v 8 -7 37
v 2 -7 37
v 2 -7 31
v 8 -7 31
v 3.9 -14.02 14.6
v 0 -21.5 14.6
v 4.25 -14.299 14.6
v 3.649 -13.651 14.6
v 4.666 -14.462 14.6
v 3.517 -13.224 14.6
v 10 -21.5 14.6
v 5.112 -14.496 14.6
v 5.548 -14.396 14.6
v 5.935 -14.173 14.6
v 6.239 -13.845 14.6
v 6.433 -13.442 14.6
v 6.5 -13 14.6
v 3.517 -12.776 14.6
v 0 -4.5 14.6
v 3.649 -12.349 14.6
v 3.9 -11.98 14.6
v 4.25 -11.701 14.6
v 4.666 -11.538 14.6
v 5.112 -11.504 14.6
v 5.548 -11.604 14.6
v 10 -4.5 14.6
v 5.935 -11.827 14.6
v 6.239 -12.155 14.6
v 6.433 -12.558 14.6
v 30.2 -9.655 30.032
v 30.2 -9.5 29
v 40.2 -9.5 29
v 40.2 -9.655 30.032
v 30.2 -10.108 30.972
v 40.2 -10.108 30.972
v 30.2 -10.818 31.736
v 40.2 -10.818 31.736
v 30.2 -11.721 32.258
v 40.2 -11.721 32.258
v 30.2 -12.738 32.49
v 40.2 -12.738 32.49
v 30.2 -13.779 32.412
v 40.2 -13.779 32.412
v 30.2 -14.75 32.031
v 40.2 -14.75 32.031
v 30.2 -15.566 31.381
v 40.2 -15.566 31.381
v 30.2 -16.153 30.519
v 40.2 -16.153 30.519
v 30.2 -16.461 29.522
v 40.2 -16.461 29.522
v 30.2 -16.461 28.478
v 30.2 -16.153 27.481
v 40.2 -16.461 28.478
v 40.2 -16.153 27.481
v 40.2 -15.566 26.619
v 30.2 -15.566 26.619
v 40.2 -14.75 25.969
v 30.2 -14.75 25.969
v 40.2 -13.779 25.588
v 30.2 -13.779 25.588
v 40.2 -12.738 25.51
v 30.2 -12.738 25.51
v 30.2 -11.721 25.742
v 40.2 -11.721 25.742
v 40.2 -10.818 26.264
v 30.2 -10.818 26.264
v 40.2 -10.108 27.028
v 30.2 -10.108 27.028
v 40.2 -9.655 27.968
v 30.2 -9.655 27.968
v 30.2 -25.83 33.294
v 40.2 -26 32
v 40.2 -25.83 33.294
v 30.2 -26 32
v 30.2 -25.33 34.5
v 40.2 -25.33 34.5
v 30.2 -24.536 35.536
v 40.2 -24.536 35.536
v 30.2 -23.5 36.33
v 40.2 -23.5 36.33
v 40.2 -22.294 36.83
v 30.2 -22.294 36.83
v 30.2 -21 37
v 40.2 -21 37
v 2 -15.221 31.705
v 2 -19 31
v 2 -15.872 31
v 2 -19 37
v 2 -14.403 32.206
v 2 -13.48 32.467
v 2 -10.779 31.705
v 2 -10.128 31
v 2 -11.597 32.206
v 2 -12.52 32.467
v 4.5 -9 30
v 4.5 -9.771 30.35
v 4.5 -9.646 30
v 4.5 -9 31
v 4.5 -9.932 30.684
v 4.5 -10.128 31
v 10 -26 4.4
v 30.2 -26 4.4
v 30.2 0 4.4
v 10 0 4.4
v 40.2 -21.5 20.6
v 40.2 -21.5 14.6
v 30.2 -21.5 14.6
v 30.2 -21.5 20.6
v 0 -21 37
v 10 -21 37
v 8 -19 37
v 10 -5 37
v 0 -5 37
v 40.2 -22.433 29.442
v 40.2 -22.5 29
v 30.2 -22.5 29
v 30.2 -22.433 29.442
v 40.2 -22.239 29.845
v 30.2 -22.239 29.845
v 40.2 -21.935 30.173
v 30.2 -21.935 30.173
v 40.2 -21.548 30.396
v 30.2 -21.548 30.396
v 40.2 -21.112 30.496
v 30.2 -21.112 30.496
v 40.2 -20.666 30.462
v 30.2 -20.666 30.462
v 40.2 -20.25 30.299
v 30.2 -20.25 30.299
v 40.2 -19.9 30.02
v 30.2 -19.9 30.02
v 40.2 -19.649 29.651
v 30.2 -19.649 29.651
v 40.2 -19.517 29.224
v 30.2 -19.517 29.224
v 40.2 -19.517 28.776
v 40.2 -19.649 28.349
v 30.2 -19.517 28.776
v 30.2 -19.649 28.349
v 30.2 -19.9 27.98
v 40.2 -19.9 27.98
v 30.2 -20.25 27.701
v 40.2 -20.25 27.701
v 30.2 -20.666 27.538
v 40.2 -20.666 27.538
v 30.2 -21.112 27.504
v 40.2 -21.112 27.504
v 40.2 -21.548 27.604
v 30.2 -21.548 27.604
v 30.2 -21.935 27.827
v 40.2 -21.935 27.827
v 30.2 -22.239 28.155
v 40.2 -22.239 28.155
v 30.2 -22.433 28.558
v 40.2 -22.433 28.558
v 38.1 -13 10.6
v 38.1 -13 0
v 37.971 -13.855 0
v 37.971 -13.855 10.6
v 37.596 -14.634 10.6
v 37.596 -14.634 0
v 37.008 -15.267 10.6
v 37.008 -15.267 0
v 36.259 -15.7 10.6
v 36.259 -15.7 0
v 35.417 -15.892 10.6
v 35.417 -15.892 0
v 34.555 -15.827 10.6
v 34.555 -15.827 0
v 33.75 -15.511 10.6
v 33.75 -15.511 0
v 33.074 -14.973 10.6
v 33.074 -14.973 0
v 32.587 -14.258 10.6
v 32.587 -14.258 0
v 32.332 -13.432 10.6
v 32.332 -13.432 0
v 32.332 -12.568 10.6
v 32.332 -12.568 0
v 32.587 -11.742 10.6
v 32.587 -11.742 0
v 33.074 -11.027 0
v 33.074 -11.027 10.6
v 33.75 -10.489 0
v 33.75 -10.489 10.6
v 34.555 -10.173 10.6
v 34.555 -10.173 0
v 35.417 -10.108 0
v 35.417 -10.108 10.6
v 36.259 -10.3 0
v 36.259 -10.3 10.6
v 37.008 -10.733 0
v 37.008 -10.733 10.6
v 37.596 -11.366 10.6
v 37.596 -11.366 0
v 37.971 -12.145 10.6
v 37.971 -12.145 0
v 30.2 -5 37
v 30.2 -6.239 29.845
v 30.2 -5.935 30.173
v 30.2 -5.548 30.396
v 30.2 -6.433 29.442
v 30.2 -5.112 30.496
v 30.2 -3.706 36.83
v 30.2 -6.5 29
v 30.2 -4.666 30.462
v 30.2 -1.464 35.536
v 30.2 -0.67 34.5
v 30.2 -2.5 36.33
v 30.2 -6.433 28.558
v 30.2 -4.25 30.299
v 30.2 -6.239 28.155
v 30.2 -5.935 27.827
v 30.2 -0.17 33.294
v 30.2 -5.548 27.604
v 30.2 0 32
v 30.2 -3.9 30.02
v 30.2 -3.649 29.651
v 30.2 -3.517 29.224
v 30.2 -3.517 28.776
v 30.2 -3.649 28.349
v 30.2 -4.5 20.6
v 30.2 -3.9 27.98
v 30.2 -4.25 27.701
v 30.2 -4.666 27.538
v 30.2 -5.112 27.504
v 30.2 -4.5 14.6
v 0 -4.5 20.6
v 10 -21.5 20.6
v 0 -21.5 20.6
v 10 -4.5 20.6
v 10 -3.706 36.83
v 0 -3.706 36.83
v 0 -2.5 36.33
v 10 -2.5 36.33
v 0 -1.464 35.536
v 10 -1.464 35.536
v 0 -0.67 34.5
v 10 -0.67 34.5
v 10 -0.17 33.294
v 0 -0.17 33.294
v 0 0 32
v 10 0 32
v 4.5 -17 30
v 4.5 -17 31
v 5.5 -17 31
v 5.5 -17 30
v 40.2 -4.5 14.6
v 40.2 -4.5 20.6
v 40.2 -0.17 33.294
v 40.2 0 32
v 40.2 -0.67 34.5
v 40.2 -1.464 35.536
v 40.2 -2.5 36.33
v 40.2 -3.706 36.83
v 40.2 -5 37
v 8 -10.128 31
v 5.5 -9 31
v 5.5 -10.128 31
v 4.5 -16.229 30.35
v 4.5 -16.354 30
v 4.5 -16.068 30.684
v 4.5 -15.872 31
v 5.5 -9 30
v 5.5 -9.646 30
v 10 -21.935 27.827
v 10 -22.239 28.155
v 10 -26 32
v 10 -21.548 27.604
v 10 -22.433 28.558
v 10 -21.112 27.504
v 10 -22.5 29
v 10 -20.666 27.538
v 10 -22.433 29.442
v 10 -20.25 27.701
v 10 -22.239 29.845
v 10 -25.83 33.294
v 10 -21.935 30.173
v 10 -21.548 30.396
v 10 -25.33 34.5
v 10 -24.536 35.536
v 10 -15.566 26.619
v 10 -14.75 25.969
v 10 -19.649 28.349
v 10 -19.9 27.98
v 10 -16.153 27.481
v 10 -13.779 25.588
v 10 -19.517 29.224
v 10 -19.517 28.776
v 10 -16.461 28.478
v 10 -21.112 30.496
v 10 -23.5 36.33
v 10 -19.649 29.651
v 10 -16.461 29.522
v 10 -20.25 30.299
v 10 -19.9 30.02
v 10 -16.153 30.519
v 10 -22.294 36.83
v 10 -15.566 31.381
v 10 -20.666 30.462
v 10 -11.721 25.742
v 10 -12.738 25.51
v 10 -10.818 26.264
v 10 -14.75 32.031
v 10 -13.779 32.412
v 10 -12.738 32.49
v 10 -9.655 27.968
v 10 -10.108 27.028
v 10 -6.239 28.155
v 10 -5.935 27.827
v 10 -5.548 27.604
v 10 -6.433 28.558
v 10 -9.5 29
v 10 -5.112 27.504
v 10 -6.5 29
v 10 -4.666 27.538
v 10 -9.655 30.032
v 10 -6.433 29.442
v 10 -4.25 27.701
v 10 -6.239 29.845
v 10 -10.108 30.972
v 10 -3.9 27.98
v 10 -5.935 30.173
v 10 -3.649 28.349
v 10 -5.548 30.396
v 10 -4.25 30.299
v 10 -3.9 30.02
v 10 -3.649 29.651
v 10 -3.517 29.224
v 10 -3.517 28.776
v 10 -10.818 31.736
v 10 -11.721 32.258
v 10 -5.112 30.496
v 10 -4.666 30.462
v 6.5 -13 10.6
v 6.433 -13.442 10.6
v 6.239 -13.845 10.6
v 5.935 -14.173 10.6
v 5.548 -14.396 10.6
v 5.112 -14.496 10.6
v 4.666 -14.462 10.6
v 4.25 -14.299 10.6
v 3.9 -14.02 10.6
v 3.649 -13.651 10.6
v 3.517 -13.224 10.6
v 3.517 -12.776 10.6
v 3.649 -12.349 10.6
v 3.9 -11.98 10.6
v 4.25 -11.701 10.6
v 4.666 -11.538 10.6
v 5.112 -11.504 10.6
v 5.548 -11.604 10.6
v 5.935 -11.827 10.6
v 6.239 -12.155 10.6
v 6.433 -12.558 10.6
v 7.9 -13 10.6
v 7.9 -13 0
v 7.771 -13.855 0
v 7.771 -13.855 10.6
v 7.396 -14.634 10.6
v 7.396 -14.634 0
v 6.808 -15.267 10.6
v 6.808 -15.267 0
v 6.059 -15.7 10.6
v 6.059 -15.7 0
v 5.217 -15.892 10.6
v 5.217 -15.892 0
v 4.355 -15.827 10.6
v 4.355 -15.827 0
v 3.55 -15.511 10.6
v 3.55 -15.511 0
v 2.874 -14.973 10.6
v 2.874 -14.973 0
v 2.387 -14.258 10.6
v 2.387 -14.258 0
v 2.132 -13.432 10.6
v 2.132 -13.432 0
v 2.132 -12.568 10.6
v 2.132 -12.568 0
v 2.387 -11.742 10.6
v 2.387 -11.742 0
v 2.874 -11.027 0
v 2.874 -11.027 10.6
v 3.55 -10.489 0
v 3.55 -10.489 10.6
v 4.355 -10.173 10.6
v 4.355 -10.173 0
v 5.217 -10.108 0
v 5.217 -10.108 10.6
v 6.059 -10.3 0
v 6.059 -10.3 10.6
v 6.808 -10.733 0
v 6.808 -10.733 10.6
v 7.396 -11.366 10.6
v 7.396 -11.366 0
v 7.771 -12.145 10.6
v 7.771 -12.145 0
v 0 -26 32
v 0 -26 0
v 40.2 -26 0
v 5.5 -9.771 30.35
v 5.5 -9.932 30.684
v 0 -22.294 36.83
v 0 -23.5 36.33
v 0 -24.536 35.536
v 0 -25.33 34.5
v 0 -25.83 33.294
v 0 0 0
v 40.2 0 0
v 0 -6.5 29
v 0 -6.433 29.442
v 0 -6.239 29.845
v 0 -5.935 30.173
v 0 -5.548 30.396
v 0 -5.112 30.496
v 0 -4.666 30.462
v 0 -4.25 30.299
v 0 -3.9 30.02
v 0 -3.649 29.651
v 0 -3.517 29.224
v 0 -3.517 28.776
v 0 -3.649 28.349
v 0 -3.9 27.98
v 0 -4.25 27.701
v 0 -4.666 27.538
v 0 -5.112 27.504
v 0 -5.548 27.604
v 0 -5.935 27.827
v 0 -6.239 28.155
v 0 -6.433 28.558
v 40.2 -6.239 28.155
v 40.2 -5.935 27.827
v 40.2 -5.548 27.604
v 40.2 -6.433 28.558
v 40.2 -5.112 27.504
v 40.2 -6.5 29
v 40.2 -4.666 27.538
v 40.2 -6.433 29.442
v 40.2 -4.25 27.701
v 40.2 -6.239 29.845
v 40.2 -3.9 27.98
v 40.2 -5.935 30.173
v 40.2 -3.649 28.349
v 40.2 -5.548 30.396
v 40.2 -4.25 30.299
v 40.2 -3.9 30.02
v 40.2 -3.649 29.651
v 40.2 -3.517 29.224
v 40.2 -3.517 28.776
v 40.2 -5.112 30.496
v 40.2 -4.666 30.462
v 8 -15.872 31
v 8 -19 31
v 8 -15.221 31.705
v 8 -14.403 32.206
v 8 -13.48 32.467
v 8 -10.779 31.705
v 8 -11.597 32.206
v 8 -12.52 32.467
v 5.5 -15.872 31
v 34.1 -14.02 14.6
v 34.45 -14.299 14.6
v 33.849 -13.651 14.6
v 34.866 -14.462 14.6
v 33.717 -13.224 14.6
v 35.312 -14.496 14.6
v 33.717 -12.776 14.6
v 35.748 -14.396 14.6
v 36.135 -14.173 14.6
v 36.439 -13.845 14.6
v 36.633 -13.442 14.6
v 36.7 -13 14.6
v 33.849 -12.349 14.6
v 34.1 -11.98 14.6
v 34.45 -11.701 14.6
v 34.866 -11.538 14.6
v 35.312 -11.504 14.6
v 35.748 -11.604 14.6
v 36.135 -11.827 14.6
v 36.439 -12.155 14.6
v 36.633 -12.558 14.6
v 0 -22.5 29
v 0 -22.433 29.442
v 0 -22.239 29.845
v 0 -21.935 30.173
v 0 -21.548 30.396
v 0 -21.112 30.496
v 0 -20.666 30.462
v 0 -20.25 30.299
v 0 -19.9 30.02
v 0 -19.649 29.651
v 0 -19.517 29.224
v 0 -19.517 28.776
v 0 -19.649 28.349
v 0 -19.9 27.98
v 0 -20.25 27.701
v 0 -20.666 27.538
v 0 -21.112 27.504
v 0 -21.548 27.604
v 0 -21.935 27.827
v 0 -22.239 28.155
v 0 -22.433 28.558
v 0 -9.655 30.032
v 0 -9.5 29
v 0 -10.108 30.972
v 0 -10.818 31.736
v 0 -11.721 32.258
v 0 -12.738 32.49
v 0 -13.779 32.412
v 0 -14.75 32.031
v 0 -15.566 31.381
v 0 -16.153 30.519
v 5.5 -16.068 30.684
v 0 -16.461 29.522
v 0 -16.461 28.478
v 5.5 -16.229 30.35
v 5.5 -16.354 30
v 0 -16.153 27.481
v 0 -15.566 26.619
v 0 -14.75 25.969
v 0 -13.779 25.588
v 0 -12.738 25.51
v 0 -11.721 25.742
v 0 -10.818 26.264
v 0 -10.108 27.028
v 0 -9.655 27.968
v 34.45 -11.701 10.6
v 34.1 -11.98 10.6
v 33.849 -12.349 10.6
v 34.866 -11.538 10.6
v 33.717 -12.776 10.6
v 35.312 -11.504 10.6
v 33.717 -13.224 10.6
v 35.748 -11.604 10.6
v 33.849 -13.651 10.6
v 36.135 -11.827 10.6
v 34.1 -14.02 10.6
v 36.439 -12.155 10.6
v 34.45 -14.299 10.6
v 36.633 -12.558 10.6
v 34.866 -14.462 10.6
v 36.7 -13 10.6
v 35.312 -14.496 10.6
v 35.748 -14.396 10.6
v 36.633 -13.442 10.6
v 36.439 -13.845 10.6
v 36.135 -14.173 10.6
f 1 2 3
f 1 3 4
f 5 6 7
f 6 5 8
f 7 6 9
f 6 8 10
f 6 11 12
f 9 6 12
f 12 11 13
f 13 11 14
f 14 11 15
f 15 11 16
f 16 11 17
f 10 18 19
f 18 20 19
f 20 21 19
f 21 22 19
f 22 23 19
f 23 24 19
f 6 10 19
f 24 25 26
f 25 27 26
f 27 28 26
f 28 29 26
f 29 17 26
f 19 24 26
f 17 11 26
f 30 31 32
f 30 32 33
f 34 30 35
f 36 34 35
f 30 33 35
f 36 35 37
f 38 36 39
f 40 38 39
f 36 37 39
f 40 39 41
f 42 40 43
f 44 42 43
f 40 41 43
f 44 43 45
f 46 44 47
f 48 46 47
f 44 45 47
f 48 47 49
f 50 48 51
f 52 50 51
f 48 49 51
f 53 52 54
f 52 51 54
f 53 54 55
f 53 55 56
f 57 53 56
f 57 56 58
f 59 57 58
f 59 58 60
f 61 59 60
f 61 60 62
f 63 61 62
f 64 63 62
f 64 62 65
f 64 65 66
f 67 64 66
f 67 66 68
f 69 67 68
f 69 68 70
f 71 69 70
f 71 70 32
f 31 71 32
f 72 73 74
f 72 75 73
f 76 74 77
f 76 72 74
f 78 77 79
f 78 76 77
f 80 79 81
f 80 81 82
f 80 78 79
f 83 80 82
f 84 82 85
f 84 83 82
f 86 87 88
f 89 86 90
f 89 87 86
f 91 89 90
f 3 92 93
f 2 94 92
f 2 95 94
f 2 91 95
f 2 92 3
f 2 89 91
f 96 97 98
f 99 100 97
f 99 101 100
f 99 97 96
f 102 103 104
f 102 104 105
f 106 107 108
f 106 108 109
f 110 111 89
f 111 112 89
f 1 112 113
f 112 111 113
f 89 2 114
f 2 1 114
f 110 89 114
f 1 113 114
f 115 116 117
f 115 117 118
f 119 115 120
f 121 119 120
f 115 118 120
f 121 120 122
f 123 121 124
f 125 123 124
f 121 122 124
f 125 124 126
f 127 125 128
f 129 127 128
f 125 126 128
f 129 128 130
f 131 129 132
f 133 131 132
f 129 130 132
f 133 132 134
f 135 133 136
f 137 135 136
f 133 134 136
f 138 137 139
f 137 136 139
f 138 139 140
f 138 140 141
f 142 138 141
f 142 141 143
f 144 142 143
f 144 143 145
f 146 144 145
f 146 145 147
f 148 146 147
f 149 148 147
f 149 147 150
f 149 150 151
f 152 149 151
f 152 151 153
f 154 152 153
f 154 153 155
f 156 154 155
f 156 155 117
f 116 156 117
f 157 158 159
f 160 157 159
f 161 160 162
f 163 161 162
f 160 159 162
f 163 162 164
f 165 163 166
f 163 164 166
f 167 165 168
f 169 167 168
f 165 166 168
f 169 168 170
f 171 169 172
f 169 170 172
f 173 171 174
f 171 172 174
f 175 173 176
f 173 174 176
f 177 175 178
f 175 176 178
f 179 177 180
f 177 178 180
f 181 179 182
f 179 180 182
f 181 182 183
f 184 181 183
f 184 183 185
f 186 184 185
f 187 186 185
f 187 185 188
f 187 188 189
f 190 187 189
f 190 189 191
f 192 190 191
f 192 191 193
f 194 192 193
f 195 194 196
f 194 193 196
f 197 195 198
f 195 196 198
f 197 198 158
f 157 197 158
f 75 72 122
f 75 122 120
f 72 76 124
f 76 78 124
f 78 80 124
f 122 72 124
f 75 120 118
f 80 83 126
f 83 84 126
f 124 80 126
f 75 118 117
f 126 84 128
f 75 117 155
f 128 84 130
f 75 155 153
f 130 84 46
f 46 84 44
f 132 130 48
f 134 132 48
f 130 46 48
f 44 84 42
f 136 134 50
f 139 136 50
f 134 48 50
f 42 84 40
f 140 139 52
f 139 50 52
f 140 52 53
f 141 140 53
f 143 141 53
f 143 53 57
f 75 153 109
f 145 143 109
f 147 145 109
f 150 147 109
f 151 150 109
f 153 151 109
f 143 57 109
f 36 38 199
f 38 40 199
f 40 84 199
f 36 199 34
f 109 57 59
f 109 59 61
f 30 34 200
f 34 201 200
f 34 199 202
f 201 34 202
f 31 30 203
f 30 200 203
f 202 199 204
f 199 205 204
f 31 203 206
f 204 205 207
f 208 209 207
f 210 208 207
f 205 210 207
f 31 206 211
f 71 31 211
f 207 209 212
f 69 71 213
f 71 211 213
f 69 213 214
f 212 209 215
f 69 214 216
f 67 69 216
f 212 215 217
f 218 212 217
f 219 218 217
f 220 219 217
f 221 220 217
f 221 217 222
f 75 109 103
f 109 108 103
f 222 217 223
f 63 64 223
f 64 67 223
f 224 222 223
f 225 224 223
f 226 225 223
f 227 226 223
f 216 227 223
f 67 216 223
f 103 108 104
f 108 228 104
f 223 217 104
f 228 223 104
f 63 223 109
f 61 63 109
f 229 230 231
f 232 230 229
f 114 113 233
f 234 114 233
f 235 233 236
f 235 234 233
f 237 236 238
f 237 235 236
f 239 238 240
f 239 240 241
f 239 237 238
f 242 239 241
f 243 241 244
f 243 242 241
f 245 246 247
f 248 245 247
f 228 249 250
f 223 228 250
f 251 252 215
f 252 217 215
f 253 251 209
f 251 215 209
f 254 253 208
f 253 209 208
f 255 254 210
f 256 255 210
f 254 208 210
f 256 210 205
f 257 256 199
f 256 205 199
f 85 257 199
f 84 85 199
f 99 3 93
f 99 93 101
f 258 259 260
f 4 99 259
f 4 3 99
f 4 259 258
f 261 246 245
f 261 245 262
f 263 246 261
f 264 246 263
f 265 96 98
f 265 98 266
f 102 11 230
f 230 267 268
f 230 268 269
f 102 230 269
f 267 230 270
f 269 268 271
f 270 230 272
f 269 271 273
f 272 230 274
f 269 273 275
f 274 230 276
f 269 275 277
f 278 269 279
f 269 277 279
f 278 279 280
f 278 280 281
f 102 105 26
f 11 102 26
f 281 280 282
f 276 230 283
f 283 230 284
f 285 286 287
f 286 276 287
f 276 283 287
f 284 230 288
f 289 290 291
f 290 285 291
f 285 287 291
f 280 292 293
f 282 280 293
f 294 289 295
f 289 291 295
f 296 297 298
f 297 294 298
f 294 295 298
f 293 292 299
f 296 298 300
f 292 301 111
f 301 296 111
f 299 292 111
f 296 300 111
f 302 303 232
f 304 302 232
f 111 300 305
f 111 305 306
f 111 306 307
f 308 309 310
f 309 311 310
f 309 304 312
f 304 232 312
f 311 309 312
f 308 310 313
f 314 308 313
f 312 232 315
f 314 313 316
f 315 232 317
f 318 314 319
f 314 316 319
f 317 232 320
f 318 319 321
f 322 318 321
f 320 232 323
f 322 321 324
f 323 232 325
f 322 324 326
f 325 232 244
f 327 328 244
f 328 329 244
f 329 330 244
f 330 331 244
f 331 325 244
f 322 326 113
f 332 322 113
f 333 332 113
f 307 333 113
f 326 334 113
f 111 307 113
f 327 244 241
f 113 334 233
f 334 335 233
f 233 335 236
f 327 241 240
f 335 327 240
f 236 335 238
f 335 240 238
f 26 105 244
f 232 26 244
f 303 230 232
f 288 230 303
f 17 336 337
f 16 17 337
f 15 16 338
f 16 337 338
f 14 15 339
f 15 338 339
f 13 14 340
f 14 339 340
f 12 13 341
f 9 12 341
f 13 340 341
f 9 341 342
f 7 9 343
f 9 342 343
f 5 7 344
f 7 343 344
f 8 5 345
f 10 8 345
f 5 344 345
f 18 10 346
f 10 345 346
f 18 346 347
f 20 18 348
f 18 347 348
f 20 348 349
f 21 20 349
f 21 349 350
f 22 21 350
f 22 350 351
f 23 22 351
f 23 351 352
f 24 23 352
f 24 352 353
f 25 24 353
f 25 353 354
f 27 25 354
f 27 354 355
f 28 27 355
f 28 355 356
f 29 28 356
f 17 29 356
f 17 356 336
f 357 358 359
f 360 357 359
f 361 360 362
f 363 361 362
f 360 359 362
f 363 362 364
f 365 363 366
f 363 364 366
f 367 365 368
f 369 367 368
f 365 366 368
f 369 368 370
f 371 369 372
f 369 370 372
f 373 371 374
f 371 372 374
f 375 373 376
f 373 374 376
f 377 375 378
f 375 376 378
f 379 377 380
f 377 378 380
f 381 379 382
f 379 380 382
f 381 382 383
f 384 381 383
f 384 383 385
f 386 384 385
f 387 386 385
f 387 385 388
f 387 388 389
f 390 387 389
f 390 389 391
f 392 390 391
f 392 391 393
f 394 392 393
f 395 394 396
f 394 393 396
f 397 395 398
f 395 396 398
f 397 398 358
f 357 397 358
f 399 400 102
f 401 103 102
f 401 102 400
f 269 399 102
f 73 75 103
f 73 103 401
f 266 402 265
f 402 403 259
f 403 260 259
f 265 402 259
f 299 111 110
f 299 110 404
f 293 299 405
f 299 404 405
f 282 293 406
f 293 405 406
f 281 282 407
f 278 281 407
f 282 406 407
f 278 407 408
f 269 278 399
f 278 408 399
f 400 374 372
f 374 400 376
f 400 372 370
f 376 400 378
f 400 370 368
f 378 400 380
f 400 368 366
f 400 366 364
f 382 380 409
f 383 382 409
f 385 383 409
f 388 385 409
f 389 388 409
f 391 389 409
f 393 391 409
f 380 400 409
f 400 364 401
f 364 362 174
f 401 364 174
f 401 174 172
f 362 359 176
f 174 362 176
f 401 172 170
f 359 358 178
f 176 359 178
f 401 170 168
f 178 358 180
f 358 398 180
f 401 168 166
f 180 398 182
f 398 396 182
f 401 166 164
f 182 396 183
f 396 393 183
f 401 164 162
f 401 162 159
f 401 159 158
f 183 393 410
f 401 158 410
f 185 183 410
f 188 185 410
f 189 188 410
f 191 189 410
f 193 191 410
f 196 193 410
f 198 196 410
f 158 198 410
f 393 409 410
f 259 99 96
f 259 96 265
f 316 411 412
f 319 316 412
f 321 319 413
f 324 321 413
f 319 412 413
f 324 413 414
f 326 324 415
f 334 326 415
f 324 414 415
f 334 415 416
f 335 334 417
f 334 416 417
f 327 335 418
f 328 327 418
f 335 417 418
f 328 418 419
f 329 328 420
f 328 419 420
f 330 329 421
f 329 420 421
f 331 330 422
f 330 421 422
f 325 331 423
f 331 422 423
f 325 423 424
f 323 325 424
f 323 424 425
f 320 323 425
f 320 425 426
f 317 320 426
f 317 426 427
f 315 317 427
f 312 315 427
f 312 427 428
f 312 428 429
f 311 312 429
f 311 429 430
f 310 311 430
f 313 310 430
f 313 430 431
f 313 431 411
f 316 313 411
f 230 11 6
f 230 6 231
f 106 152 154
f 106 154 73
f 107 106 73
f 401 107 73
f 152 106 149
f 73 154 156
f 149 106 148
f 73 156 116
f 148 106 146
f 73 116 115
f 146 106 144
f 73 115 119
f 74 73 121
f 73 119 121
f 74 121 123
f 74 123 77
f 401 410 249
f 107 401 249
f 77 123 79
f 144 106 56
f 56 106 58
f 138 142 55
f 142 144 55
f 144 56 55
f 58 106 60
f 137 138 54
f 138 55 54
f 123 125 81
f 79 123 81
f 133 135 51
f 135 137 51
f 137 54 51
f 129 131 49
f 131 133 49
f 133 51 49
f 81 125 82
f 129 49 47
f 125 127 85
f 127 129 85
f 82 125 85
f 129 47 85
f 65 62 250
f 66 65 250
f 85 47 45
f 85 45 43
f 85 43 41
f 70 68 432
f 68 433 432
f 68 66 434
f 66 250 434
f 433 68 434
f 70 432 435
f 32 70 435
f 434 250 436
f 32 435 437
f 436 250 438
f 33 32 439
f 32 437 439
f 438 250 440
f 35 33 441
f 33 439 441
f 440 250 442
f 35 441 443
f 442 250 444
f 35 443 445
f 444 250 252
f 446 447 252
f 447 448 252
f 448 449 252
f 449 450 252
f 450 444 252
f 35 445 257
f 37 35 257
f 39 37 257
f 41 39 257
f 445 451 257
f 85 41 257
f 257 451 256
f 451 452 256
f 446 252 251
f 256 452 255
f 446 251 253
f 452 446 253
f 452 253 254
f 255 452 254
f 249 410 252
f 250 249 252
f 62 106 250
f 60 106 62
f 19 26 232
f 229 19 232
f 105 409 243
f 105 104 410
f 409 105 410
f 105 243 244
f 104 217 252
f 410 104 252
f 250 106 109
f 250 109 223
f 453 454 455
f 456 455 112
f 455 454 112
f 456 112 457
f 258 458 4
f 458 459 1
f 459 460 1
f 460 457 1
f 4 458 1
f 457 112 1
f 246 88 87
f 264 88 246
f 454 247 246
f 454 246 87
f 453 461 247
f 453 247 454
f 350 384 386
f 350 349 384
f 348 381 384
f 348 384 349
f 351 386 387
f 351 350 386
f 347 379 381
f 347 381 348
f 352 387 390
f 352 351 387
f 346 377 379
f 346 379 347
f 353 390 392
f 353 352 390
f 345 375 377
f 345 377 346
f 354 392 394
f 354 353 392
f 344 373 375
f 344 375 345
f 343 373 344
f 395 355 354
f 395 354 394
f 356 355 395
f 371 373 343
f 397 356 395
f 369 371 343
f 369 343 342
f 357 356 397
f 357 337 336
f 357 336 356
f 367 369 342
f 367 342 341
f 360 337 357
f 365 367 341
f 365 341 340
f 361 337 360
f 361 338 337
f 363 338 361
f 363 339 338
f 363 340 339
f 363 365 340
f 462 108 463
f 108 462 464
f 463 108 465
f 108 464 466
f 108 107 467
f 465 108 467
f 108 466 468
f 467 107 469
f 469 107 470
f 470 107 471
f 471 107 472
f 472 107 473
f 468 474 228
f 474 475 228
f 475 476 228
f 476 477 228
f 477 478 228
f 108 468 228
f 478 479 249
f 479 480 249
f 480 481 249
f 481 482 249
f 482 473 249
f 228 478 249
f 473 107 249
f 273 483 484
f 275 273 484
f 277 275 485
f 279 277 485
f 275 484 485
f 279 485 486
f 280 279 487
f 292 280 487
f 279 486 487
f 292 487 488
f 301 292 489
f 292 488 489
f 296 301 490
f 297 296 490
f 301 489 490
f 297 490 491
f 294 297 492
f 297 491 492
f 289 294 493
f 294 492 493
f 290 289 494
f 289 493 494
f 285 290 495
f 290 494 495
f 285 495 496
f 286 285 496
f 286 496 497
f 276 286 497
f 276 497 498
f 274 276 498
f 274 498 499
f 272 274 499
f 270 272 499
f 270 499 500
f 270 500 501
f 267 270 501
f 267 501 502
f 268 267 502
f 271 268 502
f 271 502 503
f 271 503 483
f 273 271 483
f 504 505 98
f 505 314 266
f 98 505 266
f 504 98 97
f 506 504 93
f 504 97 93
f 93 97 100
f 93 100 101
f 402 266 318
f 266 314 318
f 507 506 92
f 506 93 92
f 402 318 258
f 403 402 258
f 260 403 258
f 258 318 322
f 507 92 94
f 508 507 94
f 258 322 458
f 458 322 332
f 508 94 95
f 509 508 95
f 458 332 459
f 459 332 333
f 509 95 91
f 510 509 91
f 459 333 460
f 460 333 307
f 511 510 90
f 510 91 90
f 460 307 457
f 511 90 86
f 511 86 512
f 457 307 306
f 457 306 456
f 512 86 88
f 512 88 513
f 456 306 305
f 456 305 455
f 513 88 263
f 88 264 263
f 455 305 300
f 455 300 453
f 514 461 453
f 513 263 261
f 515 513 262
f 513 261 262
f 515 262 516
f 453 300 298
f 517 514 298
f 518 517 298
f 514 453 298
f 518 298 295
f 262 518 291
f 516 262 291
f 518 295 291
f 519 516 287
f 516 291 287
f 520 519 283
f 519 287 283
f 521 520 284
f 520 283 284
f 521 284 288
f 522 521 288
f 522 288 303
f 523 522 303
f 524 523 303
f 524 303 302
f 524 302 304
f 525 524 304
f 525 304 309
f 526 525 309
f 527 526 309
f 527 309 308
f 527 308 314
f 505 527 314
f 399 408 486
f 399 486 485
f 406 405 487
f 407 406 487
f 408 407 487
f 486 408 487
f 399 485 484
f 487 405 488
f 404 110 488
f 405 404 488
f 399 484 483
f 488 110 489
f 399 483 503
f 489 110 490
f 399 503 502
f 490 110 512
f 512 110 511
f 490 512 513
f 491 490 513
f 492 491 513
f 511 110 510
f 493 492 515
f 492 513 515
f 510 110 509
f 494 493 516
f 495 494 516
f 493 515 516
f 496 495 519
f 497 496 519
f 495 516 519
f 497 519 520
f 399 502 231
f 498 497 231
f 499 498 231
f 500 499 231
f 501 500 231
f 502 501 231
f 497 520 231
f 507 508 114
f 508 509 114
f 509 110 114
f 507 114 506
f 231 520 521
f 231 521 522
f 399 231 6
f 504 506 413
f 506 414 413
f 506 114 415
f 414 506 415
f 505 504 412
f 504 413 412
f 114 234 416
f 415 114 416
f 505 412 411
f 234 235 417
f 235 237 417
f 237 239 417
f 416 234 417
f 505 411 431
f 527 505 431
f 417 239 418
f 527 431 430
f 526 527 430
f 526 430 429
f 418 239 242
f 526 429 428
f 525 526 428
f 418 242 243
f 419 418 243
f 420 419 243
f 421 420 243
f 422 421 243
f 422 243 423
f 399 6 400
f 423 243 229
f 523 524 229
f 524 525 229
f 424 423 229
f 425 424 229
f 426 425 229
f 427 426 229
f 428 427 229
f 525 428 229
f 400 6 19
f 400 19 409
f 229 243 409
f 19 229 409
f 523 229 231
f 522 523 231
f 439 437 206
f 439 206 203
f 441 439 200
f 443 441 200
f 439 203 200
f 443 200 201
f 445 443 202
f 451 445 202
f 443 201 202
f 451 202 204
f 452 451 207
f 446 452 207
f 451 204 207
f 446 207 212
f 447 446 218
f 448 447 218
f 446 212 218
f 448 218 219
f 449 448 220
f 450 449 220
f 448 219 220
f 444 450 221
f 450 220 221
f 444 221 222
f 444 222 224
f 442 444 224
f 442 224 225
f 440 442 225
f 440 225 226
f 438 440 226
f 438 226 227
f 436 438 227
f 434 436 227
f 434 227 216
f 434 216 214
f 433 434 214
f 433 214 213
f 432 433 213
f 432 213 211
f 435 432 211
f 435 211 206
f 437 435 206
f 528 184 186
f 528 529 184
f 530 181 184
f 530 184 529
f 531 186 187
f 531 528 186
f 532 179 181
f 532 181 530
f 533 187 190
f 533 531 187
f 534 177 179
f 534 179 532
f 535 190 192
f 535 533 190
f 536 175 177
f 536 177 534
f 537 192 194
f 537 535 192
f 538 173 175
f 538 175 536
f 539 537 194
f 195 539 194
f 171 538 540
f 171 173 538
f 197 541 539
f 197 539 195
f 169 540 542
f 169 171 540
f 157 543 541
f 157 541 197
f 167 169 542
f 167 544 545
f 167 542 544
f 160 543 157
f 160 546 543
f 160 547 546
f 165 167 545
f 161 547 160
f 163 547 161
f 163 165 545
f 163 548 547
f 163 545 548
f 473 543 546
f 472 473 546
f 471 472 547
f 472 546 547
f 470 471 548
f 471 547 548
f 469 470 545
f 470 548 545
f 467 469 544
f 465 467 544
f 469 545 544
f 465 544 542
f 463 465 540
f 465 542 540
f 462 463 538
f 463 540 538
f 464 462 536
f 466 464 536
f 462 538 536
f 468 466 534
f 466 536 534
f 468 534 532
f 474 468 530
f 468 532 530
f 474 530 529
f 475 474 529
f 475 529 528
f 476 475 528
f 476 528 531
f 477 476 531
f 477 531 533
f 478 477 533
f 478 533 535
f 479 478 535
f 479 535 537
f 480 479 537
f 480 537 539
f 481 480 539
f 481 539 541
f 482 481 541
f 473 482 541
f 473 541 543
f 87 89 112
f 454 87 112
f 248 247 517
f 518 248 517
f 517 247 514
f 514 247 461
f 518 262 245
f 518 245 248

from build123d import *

# Parameters (mm, degrees)
F1_DEPTH  = 26
F2_W      = 17
F2_H      = 6
F3_DEPTH  = 40.2
F4_R      = 3.5
F5_DEPTH  = 40.2
F6_R      = 1.5
F7_DEPTH  = 20.6
F8_R      = 2.9
F9_DEPTH  = 10.6
F10_R     = 1.5
F11_DEPTH = 40.2
F12_W     = 6
F12_H     = 12
F13_DEPTH = 6
F14_W     = 1
F14_H     = 8
F15_DEPTH = 1
F16_R     = 5


with BuildPart() as f1:
    # F0 (on Front) → F1 (new body)
    with BuildSketch(Plane.XZ):
        Polygon((0, 37), (0, 0), (40.2, 0), (40.2, 37), (30.2, 37), (30.2, 4.4), (10, 4.4), (10, 37), align=None)
    extrude(amount=F1_DEPTH)

    # F2 (on face) → F3 (cut, through all)
    with BuildSketch(Plane.YZ.offset(40.2)):
        with Locations((-13, 17.6)):
            Rectangle(F2_W, F2_H)
    extrude(amount=-F3_DEPTH, mode=Mode.SUBTRACT)

    # F4 (on face) → F5 (cut, through all)
    with BuildSketch(Plane.YZ.offset(40.2)):
        with Locations((-13, 29)):
            Circle(F4_R)
    extrude(amount=-F5_DEPTH, mode=Mode.SUBTRACT)

    # F6 (on face) → F7 (cut, through all)
    with BuildSketch(Plane(origin=(0, 0, 0), x_dir=(1, 0, 0), z_dir=(0, 0, -1))):
        with Locations((5, 13)):
            Circle(F6_R)
        with Locations((35.2, 13)):
            Circle(F6_R)
    extrude(amount=-F7_DEPTH, mode=Mode.SUBTRACT)

    # F8 (on face) → F9 (cut)
    with BuildSketch(Plane(origin=(0, 0, 0), x_dir=(1, 0, 0), z_dir=(0, 0, -1))):
        with Locations((5, 13)):
            Circle(F8_R)
        with Locations((35.2, 13)):
            Circle(F8_R)
    extrude(amount=-F9_DEPTH, mode=Mode.SUBTRACT)

    # F10 (on face) → F11 (cut, through all)
    with BuildSketch(Plane(origin=(0, 0, 0), x_dir=(0, -1, 0), z_dir=(-1, 0, 0))):
        with Locations((5, 29)):
            Circle(F10_R)
        with Locations((21, 29)):
            Circle(F10_R)
    extrude(amount=-F11_DEPTH, mode=Mode.SUBTRACT)

    # F12 (on face) → F13 (cut)
    with BuildSketch(Plane.XY.offset(37)):
        with Locations((5, -13)):
            Rectangle(F12_W, F12_H)
    extrude(amount=-F13_DEPTH, mode=Mode.SUBTRACT)

    # F14 (on face) → F15 (cut)
    with BuildSketch(Plane.XY.offset(31)):
        with Locations((5, -13)):
            Rectangle(F14_W, F14_H)
    extrude(amount=-F15_DEPTH, mode=Mode.SUBTRACT)

    # F16
    f16_edges = [f1.edges().sort_by_distance(p)[0] for p in [
        (5, -26, 37),
        (5, 0, 37),
        (35.2, 0, 37),
        (35.2, -26, 37),
    ]]
    fillet(f16_edges, radius=F16_R)


solid = f1.part
